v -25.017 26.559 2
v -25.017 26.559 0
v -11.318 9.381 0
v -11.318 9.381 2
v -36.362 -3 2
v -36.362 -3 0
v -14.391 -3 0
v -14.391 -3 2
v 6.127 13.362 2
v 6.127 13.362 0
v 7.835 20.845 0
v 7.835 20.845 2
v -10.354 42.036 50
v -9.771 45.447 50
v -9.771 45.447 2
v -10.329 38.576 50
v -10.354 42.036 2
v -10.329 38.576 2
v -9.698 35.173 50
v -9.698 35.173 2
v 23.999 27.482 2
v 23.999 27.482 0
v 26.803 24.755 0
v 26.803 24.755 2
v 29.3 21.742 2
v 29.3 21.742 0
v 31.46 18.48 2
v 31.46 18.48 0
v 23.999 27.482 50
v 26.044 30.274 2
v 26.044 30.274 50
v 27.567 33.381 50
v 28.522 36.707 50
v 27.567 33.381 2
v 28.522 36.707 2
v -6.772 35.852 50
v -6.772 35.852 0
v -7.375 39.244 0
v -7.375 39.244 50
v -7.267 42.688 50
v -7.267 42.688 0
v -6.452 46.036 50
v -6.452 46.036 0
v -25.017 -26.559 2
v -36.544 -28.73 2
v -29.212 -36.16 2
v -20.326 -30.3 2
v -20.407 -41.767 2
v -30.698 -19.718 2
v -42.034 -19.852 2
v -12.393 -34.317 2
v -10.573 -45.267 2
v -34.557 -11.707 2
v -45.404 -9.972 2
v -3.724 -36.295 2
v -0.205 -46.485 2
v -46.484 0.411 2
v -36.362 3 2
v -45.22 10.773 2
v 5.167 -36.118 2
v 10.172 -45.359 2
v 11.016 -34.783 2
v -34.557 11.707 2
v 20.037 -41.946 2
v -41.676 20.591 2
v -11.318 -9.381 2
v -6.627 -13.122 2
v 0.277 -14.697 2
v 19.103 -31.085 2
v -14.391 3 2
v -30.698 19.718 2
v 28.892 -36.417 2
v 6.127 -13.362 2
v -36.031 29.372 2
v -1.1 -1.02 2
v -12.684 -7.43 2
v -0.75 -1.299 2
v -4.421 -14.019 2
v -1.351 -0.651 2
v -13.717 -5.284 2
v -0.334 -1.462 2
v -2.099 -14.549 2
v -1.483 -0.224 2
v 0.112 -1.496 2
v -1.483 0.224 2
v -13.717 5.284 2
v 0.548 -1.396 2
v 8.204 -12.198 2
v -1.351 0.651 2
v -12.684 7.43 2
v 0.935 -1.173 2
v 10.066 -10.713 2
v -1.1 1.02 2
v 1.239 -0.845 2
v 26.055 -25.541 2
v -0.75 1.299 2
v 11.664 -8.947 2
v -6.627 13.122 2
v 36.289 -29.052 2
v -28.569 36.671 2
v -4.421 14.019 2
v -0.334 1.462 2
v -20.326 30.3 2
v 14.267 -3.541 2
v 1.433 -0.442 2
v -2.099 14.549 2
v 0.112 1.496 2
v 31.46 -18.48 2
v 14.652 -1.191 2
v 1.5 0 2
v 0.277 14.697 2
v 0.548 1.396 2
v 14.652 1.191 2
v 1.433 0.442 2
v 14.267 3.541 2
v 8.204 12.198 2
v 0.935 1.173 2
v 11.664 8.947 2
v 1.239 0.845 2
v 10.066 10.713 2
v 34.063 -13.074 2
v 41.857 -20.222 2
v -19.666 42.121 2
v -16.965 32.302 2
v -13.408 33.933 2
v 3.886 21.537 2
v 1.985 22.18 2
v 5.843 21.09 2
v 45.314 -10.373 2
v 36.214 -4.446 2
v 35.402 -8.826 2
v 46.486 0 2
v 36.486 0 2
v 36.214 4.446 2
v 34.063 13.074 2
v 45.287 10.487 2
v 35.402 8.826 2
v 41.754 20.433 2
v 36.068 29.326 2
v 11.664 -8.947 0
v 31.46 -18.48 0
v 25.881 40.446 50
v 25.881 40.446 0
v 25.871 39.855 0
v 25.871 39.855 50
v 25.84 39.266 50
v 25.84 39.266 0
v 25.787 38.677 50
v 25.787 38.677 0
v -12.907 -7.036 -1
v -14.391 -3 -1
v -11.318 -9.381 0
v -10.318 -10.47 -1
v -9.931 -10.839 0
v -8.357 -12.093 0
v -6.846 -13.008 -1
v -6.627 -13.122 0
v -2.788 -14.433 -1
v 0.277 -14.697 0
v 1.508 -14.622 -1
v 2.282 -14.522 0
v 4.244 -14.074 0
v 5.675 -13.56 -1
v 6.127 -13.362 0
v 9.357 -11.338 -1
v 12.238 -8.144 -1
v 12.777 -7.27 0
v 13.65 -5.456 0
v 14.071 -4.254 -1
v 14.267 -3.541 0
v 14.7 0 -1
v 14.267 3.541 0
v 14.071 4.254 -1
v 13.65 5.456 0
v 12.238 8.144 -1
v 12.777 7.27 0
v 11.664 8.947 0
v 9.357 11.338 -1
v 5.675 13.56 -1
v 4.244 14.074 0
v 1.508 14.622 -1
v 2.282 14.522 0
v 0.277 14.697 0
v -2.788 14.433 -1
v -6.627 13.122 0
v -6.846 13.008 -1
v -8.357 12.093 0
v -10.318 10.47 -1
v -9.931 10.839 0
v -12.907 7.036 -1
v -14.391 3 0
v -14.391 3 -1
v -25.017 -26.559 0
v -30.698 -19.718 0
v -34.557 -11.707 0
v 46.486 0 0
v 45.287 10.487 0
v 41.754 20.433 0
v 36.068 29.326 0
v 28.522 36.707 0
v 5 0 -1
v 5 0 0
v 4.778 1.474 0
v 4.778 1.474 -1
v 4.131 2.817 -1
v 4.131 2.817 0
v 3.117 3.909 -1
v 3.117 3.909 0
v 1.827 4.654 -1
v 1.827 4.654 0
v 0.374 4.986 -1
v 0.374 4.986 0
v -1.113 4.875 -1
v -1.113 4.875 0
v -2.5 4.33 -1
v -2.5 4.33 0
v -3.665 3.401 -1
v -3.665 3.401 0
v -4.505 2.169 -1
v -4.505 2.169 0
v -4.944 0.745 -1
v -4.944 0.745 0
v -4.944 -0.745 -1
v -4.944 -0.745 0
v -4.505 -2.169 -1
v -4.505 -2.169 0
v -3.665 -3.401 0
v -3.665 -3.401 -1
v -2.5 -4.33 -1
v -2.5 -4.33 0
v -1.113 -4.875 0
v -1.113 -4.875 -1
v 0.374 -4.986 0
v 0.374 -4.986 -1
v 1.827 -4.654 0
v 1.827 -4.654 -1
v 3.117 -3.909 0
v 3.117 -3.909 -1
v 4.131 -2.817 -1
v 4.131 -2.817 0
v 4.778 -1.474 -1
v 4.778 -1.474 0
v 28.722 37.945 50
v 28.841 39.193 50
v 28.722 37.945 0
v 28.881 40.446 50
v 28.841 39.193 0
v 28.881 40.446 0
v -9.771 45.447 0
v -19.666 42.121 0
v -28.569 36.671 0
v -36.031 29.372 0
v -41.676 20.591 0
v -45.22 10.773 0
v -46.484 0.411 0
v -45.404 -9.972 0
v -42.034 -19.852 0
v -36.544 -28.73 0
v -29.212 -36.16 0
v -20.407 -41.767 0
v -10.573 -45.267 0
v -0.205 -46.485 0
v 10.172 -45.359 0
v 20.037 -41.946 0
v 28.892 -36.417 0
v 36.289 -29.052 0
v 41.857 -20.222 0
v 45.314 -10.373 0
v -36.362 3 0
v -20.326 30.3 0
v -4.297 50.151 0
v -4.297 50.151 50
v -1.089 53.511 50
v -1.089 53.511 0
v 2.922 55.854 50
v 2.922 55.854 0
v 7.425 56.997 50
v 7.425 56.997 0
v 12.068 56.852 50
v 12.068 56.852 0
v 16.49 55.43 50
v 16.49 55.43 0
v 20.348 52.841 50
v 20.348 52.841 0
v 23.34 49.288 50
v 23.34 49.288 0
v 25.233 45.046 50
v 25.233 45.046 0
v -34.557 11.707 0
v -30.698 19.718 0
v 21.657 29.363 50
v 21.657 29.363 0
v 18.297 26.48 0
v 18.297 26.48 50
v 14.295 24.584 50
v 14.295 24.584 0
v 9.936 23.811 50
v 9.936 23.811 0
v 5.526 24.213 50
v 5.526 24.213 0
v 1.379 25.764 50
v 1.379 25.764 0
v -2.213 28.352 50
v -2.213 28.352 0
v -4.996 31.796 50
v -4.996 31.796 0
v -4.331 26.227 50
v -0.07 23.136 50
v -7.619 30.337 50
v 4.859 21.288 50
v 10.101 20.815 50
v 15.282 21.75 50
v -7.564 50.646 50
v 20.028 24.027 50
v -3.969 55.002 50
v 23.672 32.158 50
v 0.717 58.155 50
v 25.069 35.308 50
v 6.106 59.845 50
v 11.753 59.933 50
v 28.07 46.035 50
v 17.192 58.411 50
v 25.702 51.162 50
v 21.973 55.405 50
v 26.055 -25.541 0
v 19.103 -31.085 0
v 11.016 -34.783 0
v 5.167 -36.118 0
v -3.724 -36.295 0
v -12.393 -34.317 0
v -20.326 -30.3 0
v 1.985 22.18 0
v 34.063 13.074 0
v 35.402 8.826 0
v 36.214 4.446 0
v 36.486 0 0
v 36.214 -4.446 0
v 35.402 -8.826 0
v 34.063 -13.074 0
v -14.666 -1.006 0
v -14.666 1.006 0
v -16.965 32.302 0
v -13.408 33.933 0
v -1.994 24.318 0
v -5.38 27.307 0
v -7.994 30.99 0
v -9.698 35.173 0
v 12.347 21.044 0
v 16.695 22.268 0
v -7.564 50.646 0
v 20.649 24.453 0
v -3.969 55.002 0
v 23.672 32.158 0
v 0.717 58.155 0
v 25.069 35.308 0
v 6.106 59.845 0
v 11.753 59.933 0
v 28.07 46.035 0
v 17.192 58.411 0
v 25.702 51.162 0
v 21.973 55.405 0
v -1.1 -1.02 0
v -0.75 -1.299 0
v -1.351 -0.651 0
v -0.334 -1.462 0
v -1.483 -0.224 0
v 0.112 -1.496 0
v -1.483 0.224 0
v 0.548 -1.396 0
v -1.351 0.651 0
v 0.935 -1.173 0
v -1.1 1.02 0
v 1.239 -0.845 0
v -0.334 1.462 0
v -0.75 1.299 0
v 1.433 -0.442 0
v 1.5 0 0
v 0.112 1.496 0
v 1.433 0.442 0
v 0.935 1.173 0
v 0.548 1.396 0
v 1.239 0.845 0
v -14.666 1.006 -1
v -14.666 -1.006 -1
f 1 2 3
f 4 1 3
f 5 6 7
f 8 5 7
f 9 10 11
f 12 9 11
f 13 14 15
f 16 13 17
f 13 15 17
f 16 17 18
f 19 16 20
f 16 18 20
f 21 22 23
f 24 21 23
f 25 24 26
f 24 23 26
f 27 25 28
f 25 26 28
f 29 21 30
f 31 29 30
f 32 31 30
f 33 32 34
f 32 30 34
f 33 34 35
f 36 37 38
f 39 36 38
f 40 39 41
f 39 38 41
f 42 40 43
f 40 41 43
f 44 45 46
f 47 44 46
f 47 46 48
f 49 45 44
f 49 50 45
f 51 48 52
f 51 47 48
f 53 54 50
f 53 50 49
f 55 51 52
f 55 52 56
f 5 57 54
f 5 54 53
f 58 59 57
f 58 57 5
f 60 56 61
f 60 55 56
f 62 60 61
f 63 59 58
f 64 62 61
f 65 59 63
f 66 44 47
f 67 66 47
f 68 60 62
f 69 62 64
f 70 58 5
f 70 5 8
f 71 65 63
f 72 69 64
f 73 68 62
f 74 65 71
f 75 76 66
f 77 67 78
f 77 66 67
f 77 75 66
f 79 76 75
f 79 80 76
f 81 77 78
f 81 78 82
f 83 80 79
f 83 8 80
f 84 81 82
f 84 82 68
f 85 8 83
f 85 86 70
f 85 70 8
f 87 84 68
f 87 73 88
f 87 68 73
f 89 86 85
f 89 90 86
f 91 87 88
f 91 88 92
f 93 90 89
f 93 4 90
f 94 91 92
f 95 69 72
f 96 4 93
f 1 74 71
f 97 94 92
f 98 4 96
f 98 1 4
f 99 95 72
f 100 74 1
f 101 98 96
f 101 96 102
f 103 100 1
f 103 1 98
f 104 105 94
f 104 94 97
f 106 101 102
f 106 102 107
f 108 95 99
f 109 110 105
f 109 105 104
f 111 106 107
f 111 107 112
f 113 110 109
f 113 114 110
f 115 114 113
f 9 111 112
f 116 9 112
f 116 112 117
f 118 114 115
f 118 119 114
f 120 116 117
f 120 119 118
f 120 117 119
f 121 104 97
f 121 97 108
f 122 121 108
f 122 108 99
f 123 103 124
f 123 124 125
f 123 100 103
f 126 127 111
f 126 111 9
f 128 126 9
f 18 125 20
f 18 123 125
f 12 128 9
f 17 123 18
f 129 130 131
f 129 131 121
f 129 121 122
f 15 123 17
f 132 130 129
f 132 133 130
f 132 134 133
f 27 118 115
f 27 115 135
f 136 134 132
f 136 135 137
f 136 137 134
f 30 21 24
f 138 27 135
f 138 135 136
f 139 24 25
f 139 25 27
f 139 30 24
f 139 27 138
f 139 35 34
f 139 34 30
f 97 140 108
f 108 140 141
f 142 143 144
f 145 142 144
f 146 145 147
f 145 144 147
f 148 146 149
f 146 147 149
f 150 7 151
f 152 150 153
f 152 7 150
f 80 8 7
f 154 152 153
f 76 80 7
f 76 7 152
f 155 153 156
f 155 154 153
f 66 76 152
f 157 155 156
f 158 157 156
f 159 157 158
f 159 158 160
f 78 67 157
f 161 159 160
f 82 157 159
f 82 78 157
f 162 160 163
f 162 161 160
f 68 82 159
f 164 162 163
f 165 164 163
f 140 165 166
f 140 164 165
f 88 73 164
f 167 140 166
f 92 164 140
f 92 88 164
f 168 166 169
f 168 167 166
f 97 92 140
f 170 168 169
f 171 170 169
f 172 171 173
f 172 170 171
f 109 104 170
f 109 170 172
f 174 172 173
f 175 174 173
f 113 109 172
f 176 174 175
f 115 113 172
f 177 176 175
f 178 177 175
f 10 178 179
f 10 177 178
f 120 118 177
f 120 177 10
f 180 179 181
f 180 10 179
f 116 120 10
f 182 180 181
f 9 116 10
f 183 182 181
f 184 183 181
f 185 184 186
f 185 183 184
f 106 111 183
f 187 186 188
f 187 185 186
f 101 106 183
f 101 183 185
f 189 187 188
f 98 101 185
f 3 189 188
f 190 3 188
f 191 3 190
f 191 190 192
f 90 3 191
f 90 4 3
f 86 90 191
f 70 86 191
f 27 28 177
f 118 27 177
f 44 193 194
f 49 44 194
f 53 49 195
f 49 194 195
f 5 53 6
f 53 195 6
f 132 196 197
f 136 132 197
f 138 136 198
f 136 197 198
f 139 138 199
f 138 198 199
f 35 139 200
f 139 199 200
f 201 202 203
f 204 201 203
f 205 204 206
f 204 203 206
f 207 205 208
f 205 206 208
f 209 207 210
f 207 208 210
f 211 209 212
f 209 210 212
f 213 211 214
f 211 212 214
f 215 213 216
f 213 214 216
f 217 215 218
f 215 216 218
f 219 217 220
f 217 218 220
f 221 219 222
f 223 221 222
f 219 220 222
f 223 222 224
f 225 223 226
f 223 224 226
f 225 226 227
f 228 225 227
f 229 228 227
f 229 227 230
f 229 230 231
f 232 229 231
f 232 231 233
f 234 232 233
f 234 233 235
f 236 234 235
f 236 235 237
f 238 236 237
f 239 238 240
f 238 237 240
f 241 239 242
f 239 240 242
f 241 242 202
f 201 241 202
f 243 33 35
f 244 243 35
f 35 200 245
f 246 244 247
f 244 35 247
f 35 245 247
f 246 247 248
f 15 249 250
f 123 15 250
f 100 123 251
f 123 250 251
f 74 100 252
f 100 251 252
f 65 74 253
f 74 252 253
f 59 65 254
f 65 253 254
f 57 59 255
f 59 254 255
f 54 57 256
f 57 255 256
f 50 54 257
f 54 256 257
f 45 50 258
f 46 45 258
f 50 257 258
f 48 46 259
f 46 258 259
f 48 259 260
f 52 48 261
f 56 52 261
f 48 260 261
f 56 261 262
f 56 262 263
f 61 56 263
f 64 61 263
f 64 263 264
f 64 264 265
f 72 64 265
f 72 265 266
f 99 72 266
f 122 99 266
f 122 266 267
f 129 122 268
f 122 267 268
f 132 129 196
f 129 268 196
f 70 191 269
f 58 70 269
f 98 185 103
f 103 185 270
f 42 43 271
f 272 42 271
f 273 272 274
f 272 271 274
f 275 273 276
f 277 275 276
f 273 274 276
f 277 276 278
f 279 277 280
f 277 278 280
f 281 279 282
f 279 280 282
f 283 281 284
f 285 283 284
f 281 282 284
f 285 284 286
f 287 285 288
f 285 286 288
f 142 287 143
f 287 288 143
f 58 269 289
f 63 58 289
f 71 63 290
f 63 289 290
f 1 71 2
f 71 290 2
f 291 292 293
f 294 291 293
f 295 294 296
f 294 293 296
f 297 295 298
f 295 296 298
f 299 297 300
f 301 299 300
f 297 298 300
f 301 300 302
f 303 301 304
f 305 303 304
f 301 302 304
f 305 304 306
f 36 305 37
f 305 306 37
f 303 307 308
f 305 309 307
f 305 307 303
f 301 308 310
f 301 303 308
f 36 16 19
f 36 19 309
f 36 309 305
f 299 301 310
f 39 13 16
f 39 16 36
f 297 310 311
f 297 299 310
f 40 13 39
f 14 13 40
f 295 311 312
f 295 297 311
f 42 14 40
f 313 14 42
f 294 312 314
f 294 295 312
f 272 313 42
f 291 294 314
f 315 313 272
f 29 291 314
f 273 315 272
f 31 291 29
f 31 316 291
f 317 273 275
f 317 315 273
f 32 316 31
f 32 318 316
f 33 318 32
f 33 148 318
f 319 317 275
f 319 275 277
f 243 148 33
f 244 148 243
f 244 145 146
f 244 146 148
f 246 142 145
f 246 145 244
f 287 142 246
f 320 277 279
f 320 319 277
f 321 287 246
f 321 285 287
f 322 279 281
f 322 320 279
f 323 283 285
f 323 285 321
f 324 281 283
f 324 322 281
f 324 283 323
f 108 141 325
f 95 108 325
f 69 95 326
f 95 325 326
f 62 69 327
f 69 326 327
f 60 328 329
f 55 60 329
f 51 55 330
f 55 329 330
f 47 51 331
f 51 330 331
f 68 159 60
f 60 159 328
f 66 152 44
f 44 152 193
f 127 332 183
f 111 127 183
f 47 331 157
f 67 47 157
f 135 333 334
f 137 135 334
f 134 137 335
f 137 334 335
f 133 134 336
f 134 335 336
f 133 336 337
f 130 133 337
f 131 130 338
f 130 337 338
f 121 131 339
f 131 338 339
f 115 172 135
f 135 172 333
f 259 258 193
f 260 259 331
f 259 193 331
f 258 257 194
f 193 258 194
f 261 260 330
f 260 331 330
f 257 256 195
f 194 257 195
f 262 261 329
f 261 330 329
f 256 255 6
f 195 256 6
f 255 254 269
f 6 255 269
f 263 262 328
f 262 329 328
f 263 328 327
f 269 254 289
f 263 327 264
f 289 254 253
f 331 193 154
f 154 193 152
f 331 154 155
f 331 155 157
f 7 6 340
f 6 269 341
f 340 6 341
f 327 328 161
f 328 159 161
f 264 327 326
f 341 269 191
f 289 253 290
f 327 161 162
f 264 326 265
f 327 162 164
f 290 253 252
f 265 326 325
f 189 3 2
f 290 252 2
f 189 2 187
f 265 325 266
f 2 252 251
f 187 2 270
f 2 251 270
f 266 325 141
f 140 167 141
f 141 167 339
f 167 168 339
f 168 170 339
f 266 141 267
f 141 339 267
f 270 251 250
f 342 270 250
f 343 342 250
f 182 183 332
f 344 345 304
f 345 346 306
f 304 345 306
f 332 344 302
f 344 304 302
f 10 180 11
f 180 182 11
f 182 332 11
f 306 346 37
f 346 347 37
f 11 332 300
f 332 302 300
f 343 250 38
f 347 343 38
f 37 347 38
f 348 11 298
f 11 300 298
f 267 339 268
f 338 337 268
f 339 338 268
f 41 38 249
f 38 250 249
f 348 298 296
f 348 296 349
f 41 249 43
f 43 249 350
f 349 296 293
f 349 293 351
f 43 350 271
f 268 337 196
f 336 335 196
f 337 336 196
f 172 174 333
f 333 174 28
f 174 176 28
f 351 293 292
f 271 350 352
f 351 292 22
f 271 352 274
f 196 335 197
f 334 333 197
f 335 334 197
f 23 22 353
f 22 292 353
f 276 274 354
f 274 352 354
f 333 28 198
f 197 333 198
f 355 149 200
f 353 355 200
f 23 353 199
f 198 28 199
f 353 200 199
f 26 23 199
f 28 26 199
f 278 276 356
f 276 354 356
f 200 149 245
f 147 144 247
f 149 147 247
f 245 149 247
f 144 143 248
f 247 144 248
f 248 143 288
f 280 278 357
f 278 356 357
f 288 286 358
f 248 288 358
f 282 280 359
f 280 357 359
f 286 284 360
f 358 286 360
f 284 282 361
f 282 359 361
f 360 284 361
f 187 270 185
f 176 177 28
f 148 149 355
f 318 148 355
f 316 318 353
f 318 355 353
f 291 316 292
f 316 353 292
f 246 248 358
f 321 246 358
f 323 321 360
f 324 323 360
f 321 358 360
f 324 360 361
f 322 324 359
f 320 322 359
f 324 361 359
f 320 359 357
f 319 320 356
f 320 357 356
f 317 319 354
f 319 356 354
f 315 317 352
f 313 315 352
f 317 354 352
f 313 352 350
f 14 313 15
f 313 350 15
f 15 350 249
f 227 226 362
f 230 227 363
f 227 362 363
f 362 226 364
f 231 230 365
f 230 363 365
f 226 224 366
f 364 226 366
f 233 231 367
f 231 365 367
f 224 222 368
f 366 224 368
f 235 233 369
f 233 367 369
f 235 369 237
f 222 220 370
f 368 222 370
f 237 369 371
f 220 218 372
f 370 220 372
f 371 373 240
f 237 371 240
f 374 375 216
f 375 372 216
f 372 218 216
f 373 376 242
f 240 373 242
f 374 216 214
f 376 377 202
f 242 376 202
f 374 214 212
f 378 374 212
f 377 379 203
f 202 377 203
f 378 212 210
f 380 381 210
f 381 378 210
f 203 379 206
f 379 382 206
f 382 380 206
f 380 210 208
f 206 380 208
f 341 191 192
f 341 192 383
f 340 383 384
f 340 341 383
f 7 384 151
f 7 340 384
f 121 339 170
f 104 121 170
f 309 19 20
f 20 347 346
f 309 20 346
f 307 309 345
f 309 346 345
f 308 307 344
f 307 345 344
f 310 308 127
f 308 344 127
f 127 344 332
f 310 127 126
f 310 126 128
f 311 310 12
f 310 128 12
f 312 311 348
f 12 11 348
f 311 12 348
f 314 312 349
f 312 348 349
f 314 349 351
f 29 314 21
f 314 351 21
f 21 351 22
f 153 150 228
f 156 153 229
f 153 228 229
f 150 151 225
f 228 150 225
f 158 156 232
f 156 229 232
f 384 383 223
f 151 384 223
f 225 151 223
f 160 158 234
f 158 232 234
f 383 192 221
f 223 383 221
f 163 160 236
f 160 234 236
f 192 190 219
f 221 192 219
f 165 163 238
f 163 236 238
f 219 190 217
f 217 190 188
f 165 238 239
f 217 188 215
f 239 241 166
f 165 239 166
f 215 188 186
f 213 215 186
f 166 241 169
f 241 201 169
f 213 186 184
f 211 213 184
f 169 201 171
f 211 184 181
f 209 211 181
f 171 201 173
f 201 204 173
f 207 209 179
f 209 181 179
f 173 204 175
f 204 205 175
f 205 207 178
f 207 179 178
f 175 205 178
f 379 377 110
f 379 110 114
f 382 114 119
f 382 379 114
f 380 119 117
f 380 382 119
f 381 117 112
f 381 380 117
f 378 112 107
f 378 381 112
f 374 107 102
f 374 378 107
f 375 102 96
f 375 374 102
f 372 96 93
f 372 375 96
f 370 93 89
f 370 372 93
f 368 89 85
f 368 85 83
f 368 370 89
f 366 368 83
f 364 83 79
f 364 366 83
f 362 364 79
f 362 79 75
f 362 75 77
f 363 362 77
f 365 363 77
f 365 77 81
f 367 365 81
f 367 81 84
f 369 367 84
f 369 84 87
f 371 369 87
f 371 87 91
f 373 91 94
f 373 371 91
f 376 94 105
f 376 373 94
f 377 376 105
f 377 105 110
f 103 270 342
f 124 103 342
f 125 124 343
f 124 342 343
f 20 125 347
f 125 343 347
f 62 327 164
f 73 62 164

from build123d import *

# Parameters (mm, degrees)
F1_DEPTH = 2
F0_R     = 5
F0_R_2   = 1.5
F2_DEPTH = 2
F3_COUNT = 7
F4_DEPTH = 25
F5_DEPTH = 50
F6_DEPTH = 1


with BuildPart() as f1:
    # F0 (on Top) → F1 (new body)
    with BuildSketch(Plane.XY):
        with BuildLine():
            ThreePointArc((-9.6980178026, 35.1732821843), (-10.4180475342, 40.3053577212), (-9.7713618559, 45.4471900565))
            ThreePointArc((-9.7713618559, 45.4471900565), (-29.212132235, -36.1604469944), (46.4857676773, 0))
            ThreePointArc((46.4857676773, 0), (41.7541400396, 20.4332666527), (28.5224895833, 36.7068683562))
            ThreePointArc((28.5224895833, 36.7068683562), (26.8741758072, 31.793651098), (23.9987273116, 27.4822200037))
            ThreePointArc((23.9987273116, 27.4822200037), (33.217640994, 15.0930333501), (36.4857688546, 0))
            ThreePointArc((36.4857688546, 0), (1.5012714069, -36.4548695386), (-36.3622239269, -3))
            ThreePointArc((-36.3622239269, -3), (-36.4857688546, 0), (-36.3622239269, 3))
            ThreePointArc((-36.3622239269, 3), (-28.0921072309, 23.2818564603), (-9.6980178026, 35.1732821843))
        make_face()
    extrude(amount=F1_DEPTH)



with BuildPart() as f1b:
    # F0 (on Top) → F1, piece 2 (new body)
    with BuildSketch(Plane.XY):
        with BuildLine():
            ThreePointArc((14.7, 0), (1.5079551369, 14.6224509336), (-14.3906219463, 3))
            ThreePointArc((-14.3906219463, 3), (-14.7, 0), (-14.3906219463, -3))
            ThreePointArc((-14.3906219463, -3), (1.5079551369, -14.6224509336), (14.7, 0))
        make_face()
        Circle(F0_R, mode=Mode.SUBTRACT)
        Circle(F0_R)
        Circle(F0_R_2, mode=Mode.SUBTRACT)
    extrude(amount=F1_DEPTH)


with BuildPart() as f2:
    # F0 (on Top) → F2 (new body)
    with BuildSketch(Plane.XY):
        with BuildLine():
            Line((-14.3906219463, 3), (-36.3622239269, 3))
            ThreePointArc((-36.3622239269, 3), (-36.4857688546, 0), (-36.3622239269, -3))
            Line((-36.3622239269, -3), (-14.3906219463, -3))
            ThreePointArc((-14.3906219463, -3), (-14.7, 0), (-14.3906219463, 3))
        make_face()
    extrude(amount=F2_DEPTH)


with BuildPart() as f1_1:
    add(f1.part)

    add(f1b.part)  # F3 merges F1b
    # F3: F2 ×7 about axis
    f3_axis = Axis((0, 0, 2), (0, 0, -1))
    for i in range(1, F3_COUNT):
        add(f2.part.rotate(f3_axis, i * 360 / F3_COUNT))

    # F0 (on Top) → F4 (cut)
    with BuildSketch(Plane.XY):
        with BuildLine():
            ThreePointArc((21.6570841341, 29.3629364288), (8.1188473616, 35.5709944538), (-6.7722579251, 35.851748235))
            ThreePointArc((-6.7722579251, 35.851748235), (5.5264782191, 24.2130831291), (21.6570841341, 29.3629364288))
        make_face()
    extrude(amount=F4_DEPTH, mode=Mode.SUBTRACT)

    # F0 (on Top) → F5 (join)
    with BuildSketch(Plane.XY):
        with BuildLine():
            ThreePointArc((-6.4520489204, 46.03583019), (12.0680177843, 56.8522288954), (25.8814517695, 40.4456328669))
            ThreePointArc((25.8814517695, 40.4456328669), (25.8578955004, 39.5602691783), (25.7872933477, 38.6774106986))
            ThreePointArc((25.7872933477, 38.6774106986), (27.1727600693, 37.7169419064), (28.5224895833, 36.7068683562))
            ThreePointArc((28.5224895833, 36.7068683562), (28.7915053614, 38.5676543049), (28.8814517695, 40.4456328669))
            ThreePointArc((28.8814517695, 40.4456328669), (11.7530794444, 59.9331646211), (-9.7713618559, 45.4471900565))
            ThreePointArc((-9.7713618559, 45.4471900565), (-8.117043095, 45.7716091911), (-6.4520489204, 46.03583019))
        make_face()
        with BuildLine():
            ThreePointArc((-6.7722579251, 35.851748235), (-7.4103241816, 40.9688853837), (-6.4520489204, 46.03583019))
            ThreePointArc((-6.4520489204, 46.03583019), (-8.117043095, 45.7716091911), (-9.7713618559, 45.4471900565))
            ThreePointArc((-9.7713618559, 45.4471900565), (-10.4180475342, 40.3053577212), (-9.6980178026, 35.1732821843))
            ThreePointArc((-9.6980178026, 35.1732821843), (-8.2421219769, 35.5426329108), (-6.7722579251, 35.851748235))
        make_face()
        with BuildLine():
            ThreePointArc((28.5224895833, 36.7068683562), (27.1727600693, 37.7169419064), (25.7872933477, 38.6774106986))
            ThreePointArc((25.7872933477, 38.6774106986), (24.4522045664, 33.6964711194), (21.6570841341, 29.3629364288))
            ThreePointArc((21.6570841341, 29.3629364288), (22.8472657721, 28.4466830343), (23.9987273116, 27.4822200037))
            ThreePointArc((23.9987273116, 27.4822200037), (26.8741758072, 31.793651098), (28.5224895833, 36.7068683562))
        make_face()
        with BuildLine():
            ThreePointArc((21.6570841341, 29.3629364288), (5.5264782191, 24.2130831291), (-6.7722579251, 35.851748235))
            ThreePointArc((-6.7722579251, 35.851748235), (-8.2421219769, 35.5426329108), (-9.6980178026, 35.1732821843))
            ThreePointArc((-9.6980178026, 35.1732821843), (4.8589154172, 21.2882993925), (23.9987273116, 27.4822200037))
            ThreePointArc((23.9987273116, 27.4822200037), (22.8472657721, 28.4466830343), (21.6570841341, 29.3629364288))
        make_face()
    extrude(amount=F5_DEPTH)


    add(f2.part)  # F6 merges F2
    # F0 (on Top) → F6 (join)
    with BuildSketch(Plane.XY):
        with BuildLine():
            ThreePointArc((14.7, 0), (1.5079551369, 14.6224509336), (-14.3906219463, 3))
            ThreePointArc((-14.3906219463, 3), (-14.7, 0), (-14.3906219463, -3))
            ThreePointArc((-14.3906219463, -3), (1.5079551369, -14.6224509336), (14.7, 0))
        make_face()
        Circle(F0_R, mode=Mode.SUBTRACT)
    extrude(amount=-F6_DEPTH)


solid = f1_1.part
